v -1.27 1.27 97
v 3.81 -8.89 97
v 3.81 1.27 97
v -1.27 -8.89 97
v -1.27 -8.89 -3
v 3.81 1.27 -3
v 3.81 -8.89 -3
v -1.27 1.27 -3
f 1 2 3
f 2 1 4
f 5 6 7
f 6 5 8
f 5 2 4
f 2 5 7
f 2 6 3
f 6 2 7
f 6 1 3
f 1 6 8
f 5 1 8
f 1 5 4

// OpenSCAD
translate([-1.27,-3.81-2.54*2,-3])cube([2.54*2,2.54*4,100]);
